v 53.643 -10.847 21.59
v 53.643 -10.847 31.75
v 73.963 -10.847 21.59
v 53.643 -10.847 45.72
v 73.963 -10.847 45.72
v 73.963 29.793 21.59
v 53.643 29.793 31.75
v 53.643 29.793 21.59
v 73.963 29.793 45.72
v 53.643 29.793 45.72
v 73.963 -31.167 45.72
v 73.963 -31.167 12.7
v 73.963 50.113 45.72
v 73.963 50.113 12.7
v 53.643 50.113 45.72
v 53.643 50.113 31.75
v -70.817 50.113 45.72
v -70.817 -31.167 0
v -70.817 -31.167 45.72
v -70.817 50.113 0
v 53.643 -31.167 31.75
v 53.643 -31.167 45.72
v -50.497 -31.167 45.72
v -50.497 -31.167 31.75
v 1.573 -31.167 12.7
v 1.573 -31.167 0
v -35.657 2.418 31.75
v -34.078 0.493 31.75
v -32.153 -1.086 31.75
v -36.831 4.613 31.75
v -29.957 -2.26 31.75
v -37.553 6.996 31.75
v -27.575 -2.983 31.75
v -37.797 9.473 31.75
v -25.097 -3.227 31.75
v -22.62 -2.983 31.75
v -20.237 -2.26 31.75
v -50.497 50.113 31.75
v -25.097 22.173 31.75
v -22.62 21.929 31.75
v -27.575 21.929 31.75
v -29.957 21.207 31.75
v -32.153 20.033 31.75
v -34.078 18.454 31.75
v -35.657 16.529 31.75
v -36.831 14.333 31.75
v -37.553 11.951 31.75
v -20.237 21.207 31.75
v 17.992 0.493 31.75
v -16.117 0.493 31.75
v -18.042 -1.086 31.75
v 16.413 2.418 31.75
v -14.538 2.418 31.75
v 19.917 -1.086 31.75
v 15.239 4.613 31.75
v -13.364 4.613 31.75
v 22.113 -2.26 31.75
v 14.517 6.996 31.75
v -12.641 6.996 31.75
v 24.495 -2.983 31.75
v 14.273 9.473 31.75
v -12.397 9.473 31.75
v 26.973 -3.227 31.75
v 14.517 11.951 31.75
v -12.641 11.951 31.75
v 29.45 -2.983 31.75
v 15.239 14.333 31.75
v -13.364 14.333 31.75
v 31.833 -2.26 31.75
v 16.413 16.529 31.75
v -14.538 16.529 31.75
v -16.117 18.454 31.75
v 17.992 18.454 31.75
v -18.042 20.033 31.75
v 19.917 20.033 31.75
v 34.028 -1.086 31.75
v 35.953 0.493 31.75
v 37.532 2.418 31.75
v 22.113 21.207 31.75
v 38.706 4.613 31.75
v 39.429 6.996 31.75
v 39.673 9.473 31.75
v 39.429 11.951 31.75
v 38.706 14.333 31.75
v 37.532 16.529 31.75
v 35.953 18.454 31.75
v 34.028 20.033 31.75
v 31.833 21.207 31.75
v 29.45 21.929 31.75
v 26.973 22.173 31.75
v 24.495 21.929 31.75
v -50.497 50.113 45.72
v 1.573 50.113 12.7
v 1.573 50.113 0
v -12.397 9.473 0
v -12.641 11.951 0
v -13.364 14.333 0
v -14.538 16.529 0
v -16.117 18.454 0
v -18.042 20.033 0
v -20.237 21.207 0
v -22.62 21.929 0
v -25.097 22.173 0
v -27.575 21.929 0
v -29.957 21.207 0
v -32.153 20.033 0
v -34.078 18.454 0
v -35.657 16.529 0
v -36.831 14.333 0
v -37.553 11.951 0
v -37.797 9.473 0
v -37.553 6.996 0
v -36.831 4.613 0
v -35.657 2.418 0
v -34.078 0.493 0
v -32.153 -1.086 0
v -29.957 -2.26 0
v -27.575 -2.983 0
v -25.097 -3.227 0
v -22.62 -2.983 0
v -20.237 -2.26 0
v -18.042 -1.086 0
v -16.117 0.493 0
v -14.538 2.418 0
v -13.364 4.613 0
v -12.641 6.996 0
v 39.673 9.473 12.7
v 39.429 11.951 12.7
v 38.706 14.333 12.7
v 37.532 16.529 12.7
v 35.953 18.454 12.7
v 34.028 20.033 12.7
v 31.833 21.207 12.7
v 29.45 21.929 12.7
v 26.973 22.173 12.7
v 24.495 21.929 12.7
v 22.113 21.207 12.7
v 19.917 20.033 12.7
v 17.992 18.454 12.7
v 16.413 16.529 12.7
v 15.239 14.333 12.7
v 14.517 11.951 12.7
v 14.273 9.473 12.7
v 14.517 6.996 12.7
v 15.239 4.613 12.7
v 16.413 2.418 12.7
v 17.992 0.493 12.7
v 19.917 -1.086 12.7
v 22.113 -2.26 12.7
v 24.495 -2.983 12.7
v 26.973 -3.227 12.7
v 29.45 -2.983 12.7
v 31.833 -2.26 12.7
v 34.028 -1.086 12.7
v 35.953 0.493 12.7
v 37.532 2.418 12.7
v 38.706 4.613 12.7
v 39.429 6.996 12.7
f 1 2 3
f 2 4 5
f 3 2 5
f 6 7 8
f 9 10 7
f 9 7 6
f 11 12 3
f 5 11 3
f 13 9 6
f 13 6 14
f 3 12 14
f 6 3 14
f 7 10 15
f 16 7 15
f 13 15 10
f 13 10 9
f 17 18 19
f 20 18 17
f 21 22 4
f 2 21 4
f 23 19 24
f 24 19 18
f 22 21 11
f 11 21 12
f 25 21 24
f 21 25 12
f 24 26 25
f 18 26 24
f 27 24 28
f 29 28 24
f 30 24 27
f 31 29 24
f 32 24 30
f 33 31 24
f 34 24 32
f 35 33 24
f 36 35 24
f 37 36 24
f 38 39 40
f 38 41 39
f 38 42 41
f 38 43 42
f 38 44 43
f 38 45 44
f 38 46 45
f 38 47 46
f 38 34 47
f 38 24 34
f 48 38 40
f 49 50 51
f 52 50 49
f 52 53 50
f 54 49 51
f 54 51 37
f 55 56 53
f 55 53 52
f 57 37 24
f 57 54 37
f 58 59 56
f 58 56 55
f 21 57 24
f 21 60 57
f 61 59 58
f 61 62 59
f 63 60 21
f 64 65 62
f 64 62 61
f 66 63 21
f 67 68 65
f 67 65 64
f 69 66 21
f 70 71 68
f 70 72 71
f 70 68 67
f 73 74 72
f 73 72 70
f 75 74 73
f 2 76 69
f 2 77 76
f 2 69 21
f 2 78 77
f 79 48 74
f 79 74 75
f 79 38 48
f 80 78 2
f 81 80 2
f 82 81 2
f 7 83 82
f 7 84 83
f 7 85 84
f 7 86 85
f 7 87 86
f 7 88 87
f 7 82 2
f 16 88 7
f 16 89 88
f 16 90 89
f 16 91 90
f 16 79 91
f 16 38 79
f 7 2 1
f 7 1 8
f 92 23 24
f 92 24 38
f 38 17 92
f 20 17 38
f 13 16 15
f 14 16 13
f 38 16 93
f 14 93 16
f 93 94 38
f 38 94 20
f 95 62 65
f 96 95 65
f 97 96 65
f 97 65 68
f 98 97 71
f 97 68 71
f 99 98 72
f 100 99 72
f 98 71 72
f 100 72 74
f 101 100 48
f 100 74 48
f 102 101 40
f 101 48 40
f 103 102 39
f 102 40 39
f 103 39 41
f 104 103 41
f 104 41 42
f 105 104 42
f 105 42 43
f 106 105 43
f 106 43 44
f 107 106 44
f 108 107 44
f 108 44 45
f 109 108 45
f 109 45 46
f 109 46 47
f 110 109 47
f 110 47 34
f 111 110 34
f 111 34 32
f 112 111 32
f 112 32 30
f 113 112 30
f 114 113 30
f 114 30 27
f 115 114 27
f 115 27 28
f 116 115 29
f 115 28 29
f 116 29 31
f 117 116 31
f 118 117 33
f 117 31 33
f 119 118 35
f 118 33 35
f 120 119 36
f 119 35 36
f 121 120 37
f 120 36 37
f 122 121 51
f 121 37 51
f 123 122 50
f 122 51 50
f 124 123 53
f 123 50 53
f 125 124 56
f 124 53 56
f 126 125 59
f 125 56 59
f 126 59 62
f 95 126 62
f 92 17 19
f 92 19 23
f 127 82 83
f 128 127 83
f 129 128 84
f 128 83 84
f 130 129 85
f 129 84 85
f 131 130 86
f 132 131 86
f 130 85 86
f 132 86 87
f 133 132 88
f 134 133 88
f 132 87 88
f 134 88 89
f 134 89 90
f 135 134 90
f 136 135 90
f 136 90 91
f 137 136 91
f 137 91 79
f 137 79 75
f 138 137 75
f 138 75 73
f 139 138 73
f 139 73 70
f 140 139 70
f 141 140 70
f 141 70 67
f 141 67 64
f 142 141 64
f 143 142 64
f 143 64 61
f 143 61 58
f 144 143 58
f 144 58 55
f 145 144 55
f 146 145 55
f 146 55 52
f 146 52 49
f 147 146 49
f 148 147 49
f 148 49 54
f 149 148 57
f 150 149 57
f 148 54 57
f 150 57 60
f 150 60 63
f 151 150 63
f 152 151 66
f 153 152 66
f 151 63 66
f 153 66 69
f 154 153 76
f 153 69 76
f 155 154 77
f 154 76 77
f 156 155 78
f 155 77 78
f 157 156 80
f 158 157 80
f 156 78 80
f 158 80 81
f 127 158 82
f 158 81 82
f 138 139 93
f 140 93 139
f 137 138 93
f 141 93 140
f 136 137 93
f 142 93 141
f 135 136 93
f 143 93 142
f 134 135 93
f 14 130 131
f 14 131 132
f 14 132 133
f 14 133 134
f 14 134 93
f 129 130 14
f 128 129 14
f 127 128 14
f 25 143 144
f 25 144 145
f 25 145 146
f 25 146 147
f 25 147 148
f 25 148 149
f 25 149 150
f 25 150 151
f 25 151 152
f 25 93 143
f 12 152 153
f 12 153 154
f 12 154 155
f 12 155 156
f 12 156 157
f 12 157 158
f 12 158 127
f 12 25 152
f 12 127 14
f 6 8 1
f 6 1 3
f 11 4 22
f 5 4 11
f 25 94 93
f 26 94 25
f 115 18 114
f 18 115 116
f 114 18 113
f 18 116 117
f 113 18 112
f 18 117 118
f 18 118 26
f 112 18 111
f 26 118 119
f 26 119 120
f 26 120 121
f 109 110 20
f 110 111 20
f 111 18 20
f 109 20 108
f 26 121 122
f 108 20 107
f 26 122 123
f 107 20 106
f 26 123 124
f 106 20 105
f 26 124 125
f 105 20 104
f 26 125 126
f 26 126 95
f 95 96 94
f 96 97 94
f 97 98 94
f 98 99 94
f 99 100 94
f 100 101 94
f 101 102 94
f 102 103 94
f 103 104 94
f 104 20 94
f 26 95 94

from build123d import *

# Parameters (mm, degrees)
F0_W      = 144.78
F0_H      = 81.28
F1_DEPTH  = 45.72
F2_W      = 104.14
F2_H      = 81.28
F3_DEPTH  = 13.97
F4_W      = 20.32
F4_H      = 40.64
F5_DEPTH  = 24.13
F6_W      = 72.39
F6_H      = 81.28
F7_DEPTH  = 12.7
F8_R      = 12.7
F9_DEPTH  = 32.004
F10_R     = 12.7
F11_DEPTH = 19.558


with BuildPart() as f1:
    # F0 (on Top) → F1 (new body)
    with BuildSketch(Plane.XY):
        with Locations((1.572737, 9.473312)):
            Rectangle(F0_W, F0_H)
    extrude(amount=F1_DEPTH)

    # F2 (on face) → F3 (cut)
    with BuildSketch(Plane.XY.offset(45.72)):
        with Locations((1.572737, 9.473312)):
            Rectangle(F2_W, F2_H)
    extrude(amount=-F3_DEPTH, mode=Mode.SUBTRACT)

    # F4 (on face) → F5 (cut)
    with BuildSketch(Plane.XY.offset(45.72)):
        with Locations((63.802737, 9.473312)):
            Rectangle(F4_W, F4_H)
    extrude(amount=-F5_DEPTH, mode=Mode.SUBTRACT)

    # F6 (on face) → F7 (cut)
    with BuildSketch(Plane(origin=(0, 0, 0), x_dir=(1, 0, 0), z_dir=(0, 0, -1))):
        with Locations((37.767737, -9.473312)):
            Rectangle(F6_W, F6_H)
    extrude(amount=-F7_DEPTH, mode=Mode.SUBTRACT)

    # F8 (on face) → F9 (cut)
    with BuildSketch(Plane.XY.offset(31.75)):
        with Locations((-25.097263, 9.473312)):
            Circle(F8_R)
    extrude(amount=-F9_DEPTH, mode=Mode.SUBTRACT)

    # F10 (on face) → F11 (cut)
    with BuildSketch(Plane.XY.offset(31.75)):
        with Locations((26.972737, 9.473312)):
            Circle(F10_R)
    extrude(amount=-F11_DEPTH, mode=Mode.SUBTRACT)


solid = f1.part
